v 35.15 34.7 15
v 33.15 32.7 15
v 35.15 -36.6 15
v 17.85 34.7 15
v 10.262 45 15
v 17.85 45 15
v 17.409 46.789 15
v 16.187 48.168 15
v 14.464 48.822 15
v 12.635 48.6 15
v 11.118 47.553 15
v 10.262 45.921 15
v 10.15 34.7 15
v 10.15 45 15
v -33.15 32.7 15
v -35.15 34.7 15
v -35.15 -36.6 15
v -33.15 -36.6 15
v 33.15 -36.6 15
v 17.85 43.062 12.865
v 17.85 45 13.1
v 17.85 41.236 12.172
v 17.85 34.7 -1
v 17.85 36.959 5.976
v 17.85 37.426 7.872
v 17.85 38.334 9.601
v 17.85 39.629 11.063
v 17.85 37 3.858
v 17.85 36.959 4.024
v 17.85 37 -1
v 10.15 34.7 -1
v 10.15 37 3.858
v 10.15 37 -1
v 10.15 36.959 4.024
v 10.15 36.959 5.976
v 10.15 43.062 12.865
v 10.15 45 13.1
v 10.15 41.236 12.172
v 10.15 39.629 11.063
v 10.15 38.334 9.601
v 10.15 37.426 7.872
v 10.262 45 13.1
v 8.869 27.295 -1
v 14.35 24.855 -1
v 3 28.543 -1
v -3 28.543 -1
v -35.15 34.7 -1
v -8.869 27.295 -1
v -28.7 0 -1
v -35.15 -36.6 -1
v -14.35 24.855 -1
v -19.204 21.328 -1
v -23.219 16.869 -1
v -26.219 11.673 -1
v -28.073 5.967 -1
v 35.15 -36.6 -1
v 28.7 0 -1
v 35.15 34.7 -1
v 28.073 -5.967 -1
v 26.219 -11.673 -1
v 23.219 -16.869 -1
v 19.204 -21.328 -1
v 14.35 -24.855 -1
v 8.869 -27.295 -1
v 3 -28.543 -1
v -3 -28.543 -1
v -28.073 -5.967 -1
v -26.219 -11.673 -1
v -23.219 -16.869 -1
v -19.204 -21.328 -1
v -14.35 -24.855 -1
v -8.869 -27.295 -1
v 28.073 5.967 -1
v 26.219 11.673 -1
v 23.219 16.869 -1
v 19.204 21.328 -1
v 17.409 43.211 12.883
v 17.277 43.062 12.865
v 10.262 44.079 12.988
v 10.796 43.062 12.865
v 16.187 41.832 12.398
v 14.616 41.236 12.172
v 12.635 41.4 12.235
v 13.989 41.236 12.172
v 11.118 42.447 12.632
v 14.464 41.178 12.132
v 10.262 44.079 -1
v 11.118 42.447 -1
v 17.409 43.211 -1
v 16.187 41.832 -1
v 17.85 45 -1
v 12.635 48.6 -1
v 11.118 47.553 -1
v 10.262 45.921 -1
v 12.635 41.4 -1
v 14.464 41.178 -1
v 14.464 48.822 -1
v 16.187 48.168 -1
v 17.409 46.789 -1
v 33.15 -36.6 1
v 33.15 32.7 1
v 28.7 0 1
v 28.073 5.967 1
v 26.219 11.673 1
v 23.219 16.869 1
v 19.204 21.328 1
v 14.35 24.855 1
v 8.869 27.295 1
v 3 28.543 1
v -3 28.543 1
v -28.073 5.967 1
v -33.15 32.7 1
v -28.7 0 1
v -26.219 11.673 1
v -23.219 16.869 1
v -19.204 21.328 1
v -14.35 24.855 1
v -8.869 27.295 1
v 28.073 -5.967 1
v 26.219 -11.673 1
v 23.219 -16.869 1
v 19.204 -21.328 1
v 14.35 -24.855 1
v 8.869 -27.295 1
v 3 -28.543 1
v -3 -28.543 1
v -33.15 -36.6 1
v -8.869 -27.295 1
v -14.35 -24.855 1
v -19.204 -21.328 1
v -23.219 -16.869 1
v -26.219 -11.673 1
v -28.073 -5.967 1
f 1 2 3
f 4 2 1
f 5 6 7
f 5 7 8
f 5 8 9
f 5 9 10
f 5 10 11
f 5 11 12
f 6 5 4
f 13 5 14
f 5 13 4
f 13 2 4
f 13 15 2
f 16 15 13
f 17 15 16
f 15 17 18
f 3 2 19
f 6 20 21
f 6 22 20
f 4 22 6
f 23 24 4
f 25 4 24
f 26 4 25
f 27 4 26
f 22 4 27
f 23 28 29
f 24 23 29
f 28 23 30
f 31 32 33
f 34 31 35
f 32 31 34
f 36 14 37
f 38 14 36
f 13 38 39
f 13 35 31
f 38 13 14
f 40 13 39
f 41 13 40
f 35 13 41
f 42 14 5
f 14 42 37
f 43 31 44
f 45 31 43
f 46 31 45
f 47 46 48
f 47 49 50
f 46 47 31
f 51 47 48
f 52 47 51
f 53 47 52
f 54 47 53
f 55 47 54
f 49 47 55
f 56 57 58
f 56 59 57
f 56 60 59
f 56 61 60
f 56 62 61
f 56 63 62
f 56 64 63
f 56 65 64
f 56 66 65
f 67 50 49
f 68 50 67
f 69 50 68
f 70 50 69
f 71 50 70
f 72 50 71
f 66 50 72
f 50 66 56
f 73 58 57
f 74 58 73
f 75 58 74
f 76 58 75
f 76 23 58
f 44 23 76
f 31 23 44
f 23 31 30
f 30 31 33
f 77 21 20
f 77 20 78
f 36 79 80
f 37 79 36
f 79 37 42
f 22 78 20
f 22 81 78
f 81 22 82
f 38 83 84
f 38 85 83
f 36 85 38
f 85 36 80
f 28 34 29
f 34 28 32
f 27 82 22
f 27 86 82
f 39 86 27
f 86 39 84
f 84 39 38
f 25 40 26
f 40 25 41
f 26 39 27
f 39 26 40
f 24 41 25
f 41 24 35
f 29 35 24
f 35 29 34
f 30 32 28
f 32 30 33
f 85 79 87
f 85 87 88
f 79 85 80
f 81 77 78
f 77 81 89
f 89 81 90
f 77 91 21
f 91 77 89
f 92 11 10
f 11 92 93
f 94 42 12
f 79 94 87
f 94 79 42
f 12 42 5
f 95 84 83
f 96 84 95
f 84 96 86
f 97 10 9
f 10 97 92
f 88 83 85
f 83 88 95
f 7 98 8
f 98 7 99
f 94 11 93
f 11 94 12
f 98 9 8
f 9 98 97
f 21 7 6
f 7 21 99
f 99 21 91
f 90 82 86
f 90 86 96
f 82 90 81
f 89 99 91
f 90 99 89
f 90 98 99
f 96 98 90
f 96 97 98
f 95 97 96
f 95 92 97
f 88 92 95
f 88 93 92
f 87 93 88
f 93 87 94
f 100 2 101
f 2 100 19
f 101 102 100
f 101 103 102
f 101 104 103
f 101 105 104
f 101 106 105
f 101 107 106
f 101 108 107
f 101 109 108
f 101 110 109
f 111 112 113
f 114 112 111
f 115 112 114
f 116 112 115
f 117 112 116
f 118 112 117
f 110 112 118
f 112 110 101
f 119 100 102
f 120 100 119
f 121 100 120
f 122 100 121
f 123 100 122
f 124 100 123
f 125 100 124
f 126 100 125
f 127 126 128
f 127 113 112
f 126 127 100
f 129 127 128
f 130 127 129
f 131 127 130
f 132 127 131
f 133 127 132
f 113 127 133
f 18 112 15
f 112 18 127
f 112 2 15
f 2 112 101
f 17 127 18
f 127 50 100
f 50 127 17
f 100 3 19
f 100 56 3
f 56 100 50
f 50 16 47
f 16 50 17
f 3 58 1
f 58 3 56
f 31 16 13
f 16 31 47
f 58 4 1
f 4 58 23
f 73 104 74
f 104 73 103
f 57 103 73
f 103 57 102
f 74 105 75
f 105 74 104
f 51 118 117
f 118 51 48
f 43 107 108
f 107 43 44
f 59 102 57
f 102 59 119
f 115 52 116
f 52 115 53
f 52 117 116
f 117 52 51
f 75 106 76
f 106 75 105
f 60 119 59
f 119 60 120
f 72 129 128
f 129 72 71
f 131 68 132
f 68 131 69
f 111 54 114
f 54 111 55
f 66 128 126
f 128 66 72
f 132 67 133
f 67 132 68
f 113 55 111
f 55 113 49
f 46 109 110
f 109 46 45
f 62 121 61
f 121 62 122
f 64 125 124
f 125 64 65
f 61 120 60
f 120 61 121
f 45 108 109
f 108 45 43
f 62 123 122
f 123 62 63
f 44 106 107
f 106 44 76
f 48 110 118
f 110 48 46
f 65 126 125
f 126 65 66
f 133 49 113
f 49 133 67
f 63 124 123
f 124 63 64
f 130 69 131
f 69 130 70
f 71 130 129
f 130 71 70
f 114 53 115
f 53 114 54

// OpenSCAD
// file: lib.scad
use <lib.scad>

// Filter Holders with a retaining insert
module trayOuter(
  width,
  depth,
  height=3,
  cornerRadius=5,
) {
    translate([((width-(2*cornerRadius)) * -0.5),((depth-(2*cornerRadius)) * -0.5),0]){
      minkowski(){
        cube([(width-(2*cornerRadius)),(depth-(2*cornerRadius)),(height/2)]);
        cylinder(r=cornerRadius,h=(height/2));
    }
  }
}

module trayInner(
  width,
  height=1.5,
  cornerRadius=2,
) {
    translate([((width-(2*cornerRadius)) * -0.5),((width-(2*cornerRadius)) * -0.5),0]){
      minkowski(){
        cube([(width-(2*cornerRadius)),(width-(2*cornerRadius)),(height/2)]);
        cylinder(r=cornerRadius,h=(height/2));
      }
    }
}

module trayInsert(
  width,
  height=1.5,
  filterSize,
  cornerRadius=2,
  fudge=1,
) {
    difference(){
      union(){       
        trayInner(width,height,cornerRadius);
        for (i = [0, 90, 180, 270]){
          rotate([0, 0, i]){
            translate([(width/2 - 1),0,(height/2)]){
              cylinder(h=height,r=2,center=true);
            };
          };
        };            
      };
      cylinder(h=(height*2.2),r=(filterSize/2 - 1),center=true);
    };
};


module filterHolder(
  width,
  depth,
  height=3,
  base=1.5,
  filterSize
) {
  union(){
      // tray
      difference(){
        difference(){
          // tray outer
          trayOuter(width=width,depth=depth,height=height);
          // tray inner void
          #translate([0,0,(height - base)]){
            trayInner(width=filterSize,height=(height+1),cornerRadius=0);
          };
        };
        // central hole
        cylinder(h=10,r=(filterSize/2 - 1),center=true);
      }

      // handle
      translate([(-width/2 - 5),0,1]){
          union(){
              //stem
              cube([11,10,2],center=true);
              //handle
              translate([-5,0,(2-(height/2))]){
                  cube([2.5,13,height],center=true);
              }
          }
      }
  }
};

// Ilford Filter under lens carrier

module attachmentPeg (
  pegWidth = 8,
  pegHeight = 16,
  pegBridgeLen, // This is the length from the back edge of carrier to the front flat of the peg
  pegHolderDiameter = 16,
  pegBridgeWidth=32,
  pegBridgeHeight=16,
){
      union(){
         translate([-pegWidth/2,0,pegHeight/2]){
           rotate([0,90,0]){
             difference(){
               union(){
                   translate([0,0,0]){
                     cube([pegHeight/2,(pegWidth),(pegWidth)]);
                   }
                   translate([pegHeight/2-pegBridgeHeight,pegWidth/2,0]){
                     cube([(pegBridgeHeight),pegBridgeLen,(pegWidth)]);
                   };
               }
               translate([-pegHeight/8,0,-0.5]){
                   
                 union(){
                   cylinder(r=((pegHolderDiameter+0.2)/2),h=(pegBridgeWidth+1));
                   translate([-pegHolderDiameter,-pegHolderDiameter/2,0]){
                     cube([pegBridgeHeight+0.2,pegHolderDiameter,(pegBridgeWidth+1)]);
                   };
                  };
                };
             };
           };
         };
         translate([0,0,pegHeight/2]){
         cylinder(r=(pegWidth/2),h=pegHeight,center=true);         }
      };
}

module mainBody (
  width = 66.3,
  depth = 69.3,
  wall = 2,
  rearGap = 4,
  aperture = 57.4,
  pegWidth = 8,
  pegHeight = 16,
  pegOffsetX = 14,
  pegOffsetY = 45,
  pegHolderDiameter = 16,
  pegBridgeWidth=32,
  pegBridgeHeight=16,
){
   $forwardShift = (((aperture - depth)/2)+rearGap);
   $backEdgeLine = aperture/2 + rearGap;
   $pegBridgeLen = ((pegOffsetY - (pegWidth/2)) - $backEdgeLine);
   union(){
      translate([(pegOffsetX),(pegOffsetY),pegBridgeHeight - wall/2]){
        rotate([180,0,0]){
          attachmentPeg (
            pegWidth = pegWidth,
            pegHeight = pegHeight,
            pegBridgeLen = $pegBridgeLen,
            pegHolderDiameter = pegHolderDiameter,
            pegBridgeWidth = pegBridgeWidth,
            pegBridgeHeight = pegBridgeHeight
          );
        };
        // This is here just to show the registration to pegOffset
        *cylinder(r=1,h=10,center=true);
      };
      difference(){
          translate([0,$forwardShift,0]){
              #union(){
              cube([width,depth,wall],center=true);
               translate([-width/2-wall/2,0,pegBridgeHeight/2 - wall/2]){
                cube([wall,depth,pegBridgeHeight],center=true);
              };
              translate([width/2+wall/2,0,pegBridgeHeight/2 - wall/2]){
                cube([wall,depth,pegBridgeHeight],center=true);
              };
              translate([0,depth/2+wall/2,pegBridgeHeight/2 - wall/2]){
                #cube([width+2*wall,wall,pegBridgeHeight],center=true);
              };
            };
              
          };
          cylinder(h=(wall+2),r=(aperture/2),center=true);
      }
  }
};



*filterHolder(
  width=63.8,
  depth=63.8,
  height=3,
  filterSize=50.3
);

*translate([75,0,0]){
  trayInsert(
    width=50.3,
    height=1.5,
    filterSize=50.3
  );
};

mainBody();

*attachmentPeg (
  pegWidth = 7.5,
  pegHeight = 16,
  pegBridgeLen= 10 // This is the length from the back edge of carrier to the front flat of the pe
);
// main file
use <lib.scad>

mainBody(
  pegWidth = 8 - 0.3 // 8mm hole minus a little fudge factor
);
